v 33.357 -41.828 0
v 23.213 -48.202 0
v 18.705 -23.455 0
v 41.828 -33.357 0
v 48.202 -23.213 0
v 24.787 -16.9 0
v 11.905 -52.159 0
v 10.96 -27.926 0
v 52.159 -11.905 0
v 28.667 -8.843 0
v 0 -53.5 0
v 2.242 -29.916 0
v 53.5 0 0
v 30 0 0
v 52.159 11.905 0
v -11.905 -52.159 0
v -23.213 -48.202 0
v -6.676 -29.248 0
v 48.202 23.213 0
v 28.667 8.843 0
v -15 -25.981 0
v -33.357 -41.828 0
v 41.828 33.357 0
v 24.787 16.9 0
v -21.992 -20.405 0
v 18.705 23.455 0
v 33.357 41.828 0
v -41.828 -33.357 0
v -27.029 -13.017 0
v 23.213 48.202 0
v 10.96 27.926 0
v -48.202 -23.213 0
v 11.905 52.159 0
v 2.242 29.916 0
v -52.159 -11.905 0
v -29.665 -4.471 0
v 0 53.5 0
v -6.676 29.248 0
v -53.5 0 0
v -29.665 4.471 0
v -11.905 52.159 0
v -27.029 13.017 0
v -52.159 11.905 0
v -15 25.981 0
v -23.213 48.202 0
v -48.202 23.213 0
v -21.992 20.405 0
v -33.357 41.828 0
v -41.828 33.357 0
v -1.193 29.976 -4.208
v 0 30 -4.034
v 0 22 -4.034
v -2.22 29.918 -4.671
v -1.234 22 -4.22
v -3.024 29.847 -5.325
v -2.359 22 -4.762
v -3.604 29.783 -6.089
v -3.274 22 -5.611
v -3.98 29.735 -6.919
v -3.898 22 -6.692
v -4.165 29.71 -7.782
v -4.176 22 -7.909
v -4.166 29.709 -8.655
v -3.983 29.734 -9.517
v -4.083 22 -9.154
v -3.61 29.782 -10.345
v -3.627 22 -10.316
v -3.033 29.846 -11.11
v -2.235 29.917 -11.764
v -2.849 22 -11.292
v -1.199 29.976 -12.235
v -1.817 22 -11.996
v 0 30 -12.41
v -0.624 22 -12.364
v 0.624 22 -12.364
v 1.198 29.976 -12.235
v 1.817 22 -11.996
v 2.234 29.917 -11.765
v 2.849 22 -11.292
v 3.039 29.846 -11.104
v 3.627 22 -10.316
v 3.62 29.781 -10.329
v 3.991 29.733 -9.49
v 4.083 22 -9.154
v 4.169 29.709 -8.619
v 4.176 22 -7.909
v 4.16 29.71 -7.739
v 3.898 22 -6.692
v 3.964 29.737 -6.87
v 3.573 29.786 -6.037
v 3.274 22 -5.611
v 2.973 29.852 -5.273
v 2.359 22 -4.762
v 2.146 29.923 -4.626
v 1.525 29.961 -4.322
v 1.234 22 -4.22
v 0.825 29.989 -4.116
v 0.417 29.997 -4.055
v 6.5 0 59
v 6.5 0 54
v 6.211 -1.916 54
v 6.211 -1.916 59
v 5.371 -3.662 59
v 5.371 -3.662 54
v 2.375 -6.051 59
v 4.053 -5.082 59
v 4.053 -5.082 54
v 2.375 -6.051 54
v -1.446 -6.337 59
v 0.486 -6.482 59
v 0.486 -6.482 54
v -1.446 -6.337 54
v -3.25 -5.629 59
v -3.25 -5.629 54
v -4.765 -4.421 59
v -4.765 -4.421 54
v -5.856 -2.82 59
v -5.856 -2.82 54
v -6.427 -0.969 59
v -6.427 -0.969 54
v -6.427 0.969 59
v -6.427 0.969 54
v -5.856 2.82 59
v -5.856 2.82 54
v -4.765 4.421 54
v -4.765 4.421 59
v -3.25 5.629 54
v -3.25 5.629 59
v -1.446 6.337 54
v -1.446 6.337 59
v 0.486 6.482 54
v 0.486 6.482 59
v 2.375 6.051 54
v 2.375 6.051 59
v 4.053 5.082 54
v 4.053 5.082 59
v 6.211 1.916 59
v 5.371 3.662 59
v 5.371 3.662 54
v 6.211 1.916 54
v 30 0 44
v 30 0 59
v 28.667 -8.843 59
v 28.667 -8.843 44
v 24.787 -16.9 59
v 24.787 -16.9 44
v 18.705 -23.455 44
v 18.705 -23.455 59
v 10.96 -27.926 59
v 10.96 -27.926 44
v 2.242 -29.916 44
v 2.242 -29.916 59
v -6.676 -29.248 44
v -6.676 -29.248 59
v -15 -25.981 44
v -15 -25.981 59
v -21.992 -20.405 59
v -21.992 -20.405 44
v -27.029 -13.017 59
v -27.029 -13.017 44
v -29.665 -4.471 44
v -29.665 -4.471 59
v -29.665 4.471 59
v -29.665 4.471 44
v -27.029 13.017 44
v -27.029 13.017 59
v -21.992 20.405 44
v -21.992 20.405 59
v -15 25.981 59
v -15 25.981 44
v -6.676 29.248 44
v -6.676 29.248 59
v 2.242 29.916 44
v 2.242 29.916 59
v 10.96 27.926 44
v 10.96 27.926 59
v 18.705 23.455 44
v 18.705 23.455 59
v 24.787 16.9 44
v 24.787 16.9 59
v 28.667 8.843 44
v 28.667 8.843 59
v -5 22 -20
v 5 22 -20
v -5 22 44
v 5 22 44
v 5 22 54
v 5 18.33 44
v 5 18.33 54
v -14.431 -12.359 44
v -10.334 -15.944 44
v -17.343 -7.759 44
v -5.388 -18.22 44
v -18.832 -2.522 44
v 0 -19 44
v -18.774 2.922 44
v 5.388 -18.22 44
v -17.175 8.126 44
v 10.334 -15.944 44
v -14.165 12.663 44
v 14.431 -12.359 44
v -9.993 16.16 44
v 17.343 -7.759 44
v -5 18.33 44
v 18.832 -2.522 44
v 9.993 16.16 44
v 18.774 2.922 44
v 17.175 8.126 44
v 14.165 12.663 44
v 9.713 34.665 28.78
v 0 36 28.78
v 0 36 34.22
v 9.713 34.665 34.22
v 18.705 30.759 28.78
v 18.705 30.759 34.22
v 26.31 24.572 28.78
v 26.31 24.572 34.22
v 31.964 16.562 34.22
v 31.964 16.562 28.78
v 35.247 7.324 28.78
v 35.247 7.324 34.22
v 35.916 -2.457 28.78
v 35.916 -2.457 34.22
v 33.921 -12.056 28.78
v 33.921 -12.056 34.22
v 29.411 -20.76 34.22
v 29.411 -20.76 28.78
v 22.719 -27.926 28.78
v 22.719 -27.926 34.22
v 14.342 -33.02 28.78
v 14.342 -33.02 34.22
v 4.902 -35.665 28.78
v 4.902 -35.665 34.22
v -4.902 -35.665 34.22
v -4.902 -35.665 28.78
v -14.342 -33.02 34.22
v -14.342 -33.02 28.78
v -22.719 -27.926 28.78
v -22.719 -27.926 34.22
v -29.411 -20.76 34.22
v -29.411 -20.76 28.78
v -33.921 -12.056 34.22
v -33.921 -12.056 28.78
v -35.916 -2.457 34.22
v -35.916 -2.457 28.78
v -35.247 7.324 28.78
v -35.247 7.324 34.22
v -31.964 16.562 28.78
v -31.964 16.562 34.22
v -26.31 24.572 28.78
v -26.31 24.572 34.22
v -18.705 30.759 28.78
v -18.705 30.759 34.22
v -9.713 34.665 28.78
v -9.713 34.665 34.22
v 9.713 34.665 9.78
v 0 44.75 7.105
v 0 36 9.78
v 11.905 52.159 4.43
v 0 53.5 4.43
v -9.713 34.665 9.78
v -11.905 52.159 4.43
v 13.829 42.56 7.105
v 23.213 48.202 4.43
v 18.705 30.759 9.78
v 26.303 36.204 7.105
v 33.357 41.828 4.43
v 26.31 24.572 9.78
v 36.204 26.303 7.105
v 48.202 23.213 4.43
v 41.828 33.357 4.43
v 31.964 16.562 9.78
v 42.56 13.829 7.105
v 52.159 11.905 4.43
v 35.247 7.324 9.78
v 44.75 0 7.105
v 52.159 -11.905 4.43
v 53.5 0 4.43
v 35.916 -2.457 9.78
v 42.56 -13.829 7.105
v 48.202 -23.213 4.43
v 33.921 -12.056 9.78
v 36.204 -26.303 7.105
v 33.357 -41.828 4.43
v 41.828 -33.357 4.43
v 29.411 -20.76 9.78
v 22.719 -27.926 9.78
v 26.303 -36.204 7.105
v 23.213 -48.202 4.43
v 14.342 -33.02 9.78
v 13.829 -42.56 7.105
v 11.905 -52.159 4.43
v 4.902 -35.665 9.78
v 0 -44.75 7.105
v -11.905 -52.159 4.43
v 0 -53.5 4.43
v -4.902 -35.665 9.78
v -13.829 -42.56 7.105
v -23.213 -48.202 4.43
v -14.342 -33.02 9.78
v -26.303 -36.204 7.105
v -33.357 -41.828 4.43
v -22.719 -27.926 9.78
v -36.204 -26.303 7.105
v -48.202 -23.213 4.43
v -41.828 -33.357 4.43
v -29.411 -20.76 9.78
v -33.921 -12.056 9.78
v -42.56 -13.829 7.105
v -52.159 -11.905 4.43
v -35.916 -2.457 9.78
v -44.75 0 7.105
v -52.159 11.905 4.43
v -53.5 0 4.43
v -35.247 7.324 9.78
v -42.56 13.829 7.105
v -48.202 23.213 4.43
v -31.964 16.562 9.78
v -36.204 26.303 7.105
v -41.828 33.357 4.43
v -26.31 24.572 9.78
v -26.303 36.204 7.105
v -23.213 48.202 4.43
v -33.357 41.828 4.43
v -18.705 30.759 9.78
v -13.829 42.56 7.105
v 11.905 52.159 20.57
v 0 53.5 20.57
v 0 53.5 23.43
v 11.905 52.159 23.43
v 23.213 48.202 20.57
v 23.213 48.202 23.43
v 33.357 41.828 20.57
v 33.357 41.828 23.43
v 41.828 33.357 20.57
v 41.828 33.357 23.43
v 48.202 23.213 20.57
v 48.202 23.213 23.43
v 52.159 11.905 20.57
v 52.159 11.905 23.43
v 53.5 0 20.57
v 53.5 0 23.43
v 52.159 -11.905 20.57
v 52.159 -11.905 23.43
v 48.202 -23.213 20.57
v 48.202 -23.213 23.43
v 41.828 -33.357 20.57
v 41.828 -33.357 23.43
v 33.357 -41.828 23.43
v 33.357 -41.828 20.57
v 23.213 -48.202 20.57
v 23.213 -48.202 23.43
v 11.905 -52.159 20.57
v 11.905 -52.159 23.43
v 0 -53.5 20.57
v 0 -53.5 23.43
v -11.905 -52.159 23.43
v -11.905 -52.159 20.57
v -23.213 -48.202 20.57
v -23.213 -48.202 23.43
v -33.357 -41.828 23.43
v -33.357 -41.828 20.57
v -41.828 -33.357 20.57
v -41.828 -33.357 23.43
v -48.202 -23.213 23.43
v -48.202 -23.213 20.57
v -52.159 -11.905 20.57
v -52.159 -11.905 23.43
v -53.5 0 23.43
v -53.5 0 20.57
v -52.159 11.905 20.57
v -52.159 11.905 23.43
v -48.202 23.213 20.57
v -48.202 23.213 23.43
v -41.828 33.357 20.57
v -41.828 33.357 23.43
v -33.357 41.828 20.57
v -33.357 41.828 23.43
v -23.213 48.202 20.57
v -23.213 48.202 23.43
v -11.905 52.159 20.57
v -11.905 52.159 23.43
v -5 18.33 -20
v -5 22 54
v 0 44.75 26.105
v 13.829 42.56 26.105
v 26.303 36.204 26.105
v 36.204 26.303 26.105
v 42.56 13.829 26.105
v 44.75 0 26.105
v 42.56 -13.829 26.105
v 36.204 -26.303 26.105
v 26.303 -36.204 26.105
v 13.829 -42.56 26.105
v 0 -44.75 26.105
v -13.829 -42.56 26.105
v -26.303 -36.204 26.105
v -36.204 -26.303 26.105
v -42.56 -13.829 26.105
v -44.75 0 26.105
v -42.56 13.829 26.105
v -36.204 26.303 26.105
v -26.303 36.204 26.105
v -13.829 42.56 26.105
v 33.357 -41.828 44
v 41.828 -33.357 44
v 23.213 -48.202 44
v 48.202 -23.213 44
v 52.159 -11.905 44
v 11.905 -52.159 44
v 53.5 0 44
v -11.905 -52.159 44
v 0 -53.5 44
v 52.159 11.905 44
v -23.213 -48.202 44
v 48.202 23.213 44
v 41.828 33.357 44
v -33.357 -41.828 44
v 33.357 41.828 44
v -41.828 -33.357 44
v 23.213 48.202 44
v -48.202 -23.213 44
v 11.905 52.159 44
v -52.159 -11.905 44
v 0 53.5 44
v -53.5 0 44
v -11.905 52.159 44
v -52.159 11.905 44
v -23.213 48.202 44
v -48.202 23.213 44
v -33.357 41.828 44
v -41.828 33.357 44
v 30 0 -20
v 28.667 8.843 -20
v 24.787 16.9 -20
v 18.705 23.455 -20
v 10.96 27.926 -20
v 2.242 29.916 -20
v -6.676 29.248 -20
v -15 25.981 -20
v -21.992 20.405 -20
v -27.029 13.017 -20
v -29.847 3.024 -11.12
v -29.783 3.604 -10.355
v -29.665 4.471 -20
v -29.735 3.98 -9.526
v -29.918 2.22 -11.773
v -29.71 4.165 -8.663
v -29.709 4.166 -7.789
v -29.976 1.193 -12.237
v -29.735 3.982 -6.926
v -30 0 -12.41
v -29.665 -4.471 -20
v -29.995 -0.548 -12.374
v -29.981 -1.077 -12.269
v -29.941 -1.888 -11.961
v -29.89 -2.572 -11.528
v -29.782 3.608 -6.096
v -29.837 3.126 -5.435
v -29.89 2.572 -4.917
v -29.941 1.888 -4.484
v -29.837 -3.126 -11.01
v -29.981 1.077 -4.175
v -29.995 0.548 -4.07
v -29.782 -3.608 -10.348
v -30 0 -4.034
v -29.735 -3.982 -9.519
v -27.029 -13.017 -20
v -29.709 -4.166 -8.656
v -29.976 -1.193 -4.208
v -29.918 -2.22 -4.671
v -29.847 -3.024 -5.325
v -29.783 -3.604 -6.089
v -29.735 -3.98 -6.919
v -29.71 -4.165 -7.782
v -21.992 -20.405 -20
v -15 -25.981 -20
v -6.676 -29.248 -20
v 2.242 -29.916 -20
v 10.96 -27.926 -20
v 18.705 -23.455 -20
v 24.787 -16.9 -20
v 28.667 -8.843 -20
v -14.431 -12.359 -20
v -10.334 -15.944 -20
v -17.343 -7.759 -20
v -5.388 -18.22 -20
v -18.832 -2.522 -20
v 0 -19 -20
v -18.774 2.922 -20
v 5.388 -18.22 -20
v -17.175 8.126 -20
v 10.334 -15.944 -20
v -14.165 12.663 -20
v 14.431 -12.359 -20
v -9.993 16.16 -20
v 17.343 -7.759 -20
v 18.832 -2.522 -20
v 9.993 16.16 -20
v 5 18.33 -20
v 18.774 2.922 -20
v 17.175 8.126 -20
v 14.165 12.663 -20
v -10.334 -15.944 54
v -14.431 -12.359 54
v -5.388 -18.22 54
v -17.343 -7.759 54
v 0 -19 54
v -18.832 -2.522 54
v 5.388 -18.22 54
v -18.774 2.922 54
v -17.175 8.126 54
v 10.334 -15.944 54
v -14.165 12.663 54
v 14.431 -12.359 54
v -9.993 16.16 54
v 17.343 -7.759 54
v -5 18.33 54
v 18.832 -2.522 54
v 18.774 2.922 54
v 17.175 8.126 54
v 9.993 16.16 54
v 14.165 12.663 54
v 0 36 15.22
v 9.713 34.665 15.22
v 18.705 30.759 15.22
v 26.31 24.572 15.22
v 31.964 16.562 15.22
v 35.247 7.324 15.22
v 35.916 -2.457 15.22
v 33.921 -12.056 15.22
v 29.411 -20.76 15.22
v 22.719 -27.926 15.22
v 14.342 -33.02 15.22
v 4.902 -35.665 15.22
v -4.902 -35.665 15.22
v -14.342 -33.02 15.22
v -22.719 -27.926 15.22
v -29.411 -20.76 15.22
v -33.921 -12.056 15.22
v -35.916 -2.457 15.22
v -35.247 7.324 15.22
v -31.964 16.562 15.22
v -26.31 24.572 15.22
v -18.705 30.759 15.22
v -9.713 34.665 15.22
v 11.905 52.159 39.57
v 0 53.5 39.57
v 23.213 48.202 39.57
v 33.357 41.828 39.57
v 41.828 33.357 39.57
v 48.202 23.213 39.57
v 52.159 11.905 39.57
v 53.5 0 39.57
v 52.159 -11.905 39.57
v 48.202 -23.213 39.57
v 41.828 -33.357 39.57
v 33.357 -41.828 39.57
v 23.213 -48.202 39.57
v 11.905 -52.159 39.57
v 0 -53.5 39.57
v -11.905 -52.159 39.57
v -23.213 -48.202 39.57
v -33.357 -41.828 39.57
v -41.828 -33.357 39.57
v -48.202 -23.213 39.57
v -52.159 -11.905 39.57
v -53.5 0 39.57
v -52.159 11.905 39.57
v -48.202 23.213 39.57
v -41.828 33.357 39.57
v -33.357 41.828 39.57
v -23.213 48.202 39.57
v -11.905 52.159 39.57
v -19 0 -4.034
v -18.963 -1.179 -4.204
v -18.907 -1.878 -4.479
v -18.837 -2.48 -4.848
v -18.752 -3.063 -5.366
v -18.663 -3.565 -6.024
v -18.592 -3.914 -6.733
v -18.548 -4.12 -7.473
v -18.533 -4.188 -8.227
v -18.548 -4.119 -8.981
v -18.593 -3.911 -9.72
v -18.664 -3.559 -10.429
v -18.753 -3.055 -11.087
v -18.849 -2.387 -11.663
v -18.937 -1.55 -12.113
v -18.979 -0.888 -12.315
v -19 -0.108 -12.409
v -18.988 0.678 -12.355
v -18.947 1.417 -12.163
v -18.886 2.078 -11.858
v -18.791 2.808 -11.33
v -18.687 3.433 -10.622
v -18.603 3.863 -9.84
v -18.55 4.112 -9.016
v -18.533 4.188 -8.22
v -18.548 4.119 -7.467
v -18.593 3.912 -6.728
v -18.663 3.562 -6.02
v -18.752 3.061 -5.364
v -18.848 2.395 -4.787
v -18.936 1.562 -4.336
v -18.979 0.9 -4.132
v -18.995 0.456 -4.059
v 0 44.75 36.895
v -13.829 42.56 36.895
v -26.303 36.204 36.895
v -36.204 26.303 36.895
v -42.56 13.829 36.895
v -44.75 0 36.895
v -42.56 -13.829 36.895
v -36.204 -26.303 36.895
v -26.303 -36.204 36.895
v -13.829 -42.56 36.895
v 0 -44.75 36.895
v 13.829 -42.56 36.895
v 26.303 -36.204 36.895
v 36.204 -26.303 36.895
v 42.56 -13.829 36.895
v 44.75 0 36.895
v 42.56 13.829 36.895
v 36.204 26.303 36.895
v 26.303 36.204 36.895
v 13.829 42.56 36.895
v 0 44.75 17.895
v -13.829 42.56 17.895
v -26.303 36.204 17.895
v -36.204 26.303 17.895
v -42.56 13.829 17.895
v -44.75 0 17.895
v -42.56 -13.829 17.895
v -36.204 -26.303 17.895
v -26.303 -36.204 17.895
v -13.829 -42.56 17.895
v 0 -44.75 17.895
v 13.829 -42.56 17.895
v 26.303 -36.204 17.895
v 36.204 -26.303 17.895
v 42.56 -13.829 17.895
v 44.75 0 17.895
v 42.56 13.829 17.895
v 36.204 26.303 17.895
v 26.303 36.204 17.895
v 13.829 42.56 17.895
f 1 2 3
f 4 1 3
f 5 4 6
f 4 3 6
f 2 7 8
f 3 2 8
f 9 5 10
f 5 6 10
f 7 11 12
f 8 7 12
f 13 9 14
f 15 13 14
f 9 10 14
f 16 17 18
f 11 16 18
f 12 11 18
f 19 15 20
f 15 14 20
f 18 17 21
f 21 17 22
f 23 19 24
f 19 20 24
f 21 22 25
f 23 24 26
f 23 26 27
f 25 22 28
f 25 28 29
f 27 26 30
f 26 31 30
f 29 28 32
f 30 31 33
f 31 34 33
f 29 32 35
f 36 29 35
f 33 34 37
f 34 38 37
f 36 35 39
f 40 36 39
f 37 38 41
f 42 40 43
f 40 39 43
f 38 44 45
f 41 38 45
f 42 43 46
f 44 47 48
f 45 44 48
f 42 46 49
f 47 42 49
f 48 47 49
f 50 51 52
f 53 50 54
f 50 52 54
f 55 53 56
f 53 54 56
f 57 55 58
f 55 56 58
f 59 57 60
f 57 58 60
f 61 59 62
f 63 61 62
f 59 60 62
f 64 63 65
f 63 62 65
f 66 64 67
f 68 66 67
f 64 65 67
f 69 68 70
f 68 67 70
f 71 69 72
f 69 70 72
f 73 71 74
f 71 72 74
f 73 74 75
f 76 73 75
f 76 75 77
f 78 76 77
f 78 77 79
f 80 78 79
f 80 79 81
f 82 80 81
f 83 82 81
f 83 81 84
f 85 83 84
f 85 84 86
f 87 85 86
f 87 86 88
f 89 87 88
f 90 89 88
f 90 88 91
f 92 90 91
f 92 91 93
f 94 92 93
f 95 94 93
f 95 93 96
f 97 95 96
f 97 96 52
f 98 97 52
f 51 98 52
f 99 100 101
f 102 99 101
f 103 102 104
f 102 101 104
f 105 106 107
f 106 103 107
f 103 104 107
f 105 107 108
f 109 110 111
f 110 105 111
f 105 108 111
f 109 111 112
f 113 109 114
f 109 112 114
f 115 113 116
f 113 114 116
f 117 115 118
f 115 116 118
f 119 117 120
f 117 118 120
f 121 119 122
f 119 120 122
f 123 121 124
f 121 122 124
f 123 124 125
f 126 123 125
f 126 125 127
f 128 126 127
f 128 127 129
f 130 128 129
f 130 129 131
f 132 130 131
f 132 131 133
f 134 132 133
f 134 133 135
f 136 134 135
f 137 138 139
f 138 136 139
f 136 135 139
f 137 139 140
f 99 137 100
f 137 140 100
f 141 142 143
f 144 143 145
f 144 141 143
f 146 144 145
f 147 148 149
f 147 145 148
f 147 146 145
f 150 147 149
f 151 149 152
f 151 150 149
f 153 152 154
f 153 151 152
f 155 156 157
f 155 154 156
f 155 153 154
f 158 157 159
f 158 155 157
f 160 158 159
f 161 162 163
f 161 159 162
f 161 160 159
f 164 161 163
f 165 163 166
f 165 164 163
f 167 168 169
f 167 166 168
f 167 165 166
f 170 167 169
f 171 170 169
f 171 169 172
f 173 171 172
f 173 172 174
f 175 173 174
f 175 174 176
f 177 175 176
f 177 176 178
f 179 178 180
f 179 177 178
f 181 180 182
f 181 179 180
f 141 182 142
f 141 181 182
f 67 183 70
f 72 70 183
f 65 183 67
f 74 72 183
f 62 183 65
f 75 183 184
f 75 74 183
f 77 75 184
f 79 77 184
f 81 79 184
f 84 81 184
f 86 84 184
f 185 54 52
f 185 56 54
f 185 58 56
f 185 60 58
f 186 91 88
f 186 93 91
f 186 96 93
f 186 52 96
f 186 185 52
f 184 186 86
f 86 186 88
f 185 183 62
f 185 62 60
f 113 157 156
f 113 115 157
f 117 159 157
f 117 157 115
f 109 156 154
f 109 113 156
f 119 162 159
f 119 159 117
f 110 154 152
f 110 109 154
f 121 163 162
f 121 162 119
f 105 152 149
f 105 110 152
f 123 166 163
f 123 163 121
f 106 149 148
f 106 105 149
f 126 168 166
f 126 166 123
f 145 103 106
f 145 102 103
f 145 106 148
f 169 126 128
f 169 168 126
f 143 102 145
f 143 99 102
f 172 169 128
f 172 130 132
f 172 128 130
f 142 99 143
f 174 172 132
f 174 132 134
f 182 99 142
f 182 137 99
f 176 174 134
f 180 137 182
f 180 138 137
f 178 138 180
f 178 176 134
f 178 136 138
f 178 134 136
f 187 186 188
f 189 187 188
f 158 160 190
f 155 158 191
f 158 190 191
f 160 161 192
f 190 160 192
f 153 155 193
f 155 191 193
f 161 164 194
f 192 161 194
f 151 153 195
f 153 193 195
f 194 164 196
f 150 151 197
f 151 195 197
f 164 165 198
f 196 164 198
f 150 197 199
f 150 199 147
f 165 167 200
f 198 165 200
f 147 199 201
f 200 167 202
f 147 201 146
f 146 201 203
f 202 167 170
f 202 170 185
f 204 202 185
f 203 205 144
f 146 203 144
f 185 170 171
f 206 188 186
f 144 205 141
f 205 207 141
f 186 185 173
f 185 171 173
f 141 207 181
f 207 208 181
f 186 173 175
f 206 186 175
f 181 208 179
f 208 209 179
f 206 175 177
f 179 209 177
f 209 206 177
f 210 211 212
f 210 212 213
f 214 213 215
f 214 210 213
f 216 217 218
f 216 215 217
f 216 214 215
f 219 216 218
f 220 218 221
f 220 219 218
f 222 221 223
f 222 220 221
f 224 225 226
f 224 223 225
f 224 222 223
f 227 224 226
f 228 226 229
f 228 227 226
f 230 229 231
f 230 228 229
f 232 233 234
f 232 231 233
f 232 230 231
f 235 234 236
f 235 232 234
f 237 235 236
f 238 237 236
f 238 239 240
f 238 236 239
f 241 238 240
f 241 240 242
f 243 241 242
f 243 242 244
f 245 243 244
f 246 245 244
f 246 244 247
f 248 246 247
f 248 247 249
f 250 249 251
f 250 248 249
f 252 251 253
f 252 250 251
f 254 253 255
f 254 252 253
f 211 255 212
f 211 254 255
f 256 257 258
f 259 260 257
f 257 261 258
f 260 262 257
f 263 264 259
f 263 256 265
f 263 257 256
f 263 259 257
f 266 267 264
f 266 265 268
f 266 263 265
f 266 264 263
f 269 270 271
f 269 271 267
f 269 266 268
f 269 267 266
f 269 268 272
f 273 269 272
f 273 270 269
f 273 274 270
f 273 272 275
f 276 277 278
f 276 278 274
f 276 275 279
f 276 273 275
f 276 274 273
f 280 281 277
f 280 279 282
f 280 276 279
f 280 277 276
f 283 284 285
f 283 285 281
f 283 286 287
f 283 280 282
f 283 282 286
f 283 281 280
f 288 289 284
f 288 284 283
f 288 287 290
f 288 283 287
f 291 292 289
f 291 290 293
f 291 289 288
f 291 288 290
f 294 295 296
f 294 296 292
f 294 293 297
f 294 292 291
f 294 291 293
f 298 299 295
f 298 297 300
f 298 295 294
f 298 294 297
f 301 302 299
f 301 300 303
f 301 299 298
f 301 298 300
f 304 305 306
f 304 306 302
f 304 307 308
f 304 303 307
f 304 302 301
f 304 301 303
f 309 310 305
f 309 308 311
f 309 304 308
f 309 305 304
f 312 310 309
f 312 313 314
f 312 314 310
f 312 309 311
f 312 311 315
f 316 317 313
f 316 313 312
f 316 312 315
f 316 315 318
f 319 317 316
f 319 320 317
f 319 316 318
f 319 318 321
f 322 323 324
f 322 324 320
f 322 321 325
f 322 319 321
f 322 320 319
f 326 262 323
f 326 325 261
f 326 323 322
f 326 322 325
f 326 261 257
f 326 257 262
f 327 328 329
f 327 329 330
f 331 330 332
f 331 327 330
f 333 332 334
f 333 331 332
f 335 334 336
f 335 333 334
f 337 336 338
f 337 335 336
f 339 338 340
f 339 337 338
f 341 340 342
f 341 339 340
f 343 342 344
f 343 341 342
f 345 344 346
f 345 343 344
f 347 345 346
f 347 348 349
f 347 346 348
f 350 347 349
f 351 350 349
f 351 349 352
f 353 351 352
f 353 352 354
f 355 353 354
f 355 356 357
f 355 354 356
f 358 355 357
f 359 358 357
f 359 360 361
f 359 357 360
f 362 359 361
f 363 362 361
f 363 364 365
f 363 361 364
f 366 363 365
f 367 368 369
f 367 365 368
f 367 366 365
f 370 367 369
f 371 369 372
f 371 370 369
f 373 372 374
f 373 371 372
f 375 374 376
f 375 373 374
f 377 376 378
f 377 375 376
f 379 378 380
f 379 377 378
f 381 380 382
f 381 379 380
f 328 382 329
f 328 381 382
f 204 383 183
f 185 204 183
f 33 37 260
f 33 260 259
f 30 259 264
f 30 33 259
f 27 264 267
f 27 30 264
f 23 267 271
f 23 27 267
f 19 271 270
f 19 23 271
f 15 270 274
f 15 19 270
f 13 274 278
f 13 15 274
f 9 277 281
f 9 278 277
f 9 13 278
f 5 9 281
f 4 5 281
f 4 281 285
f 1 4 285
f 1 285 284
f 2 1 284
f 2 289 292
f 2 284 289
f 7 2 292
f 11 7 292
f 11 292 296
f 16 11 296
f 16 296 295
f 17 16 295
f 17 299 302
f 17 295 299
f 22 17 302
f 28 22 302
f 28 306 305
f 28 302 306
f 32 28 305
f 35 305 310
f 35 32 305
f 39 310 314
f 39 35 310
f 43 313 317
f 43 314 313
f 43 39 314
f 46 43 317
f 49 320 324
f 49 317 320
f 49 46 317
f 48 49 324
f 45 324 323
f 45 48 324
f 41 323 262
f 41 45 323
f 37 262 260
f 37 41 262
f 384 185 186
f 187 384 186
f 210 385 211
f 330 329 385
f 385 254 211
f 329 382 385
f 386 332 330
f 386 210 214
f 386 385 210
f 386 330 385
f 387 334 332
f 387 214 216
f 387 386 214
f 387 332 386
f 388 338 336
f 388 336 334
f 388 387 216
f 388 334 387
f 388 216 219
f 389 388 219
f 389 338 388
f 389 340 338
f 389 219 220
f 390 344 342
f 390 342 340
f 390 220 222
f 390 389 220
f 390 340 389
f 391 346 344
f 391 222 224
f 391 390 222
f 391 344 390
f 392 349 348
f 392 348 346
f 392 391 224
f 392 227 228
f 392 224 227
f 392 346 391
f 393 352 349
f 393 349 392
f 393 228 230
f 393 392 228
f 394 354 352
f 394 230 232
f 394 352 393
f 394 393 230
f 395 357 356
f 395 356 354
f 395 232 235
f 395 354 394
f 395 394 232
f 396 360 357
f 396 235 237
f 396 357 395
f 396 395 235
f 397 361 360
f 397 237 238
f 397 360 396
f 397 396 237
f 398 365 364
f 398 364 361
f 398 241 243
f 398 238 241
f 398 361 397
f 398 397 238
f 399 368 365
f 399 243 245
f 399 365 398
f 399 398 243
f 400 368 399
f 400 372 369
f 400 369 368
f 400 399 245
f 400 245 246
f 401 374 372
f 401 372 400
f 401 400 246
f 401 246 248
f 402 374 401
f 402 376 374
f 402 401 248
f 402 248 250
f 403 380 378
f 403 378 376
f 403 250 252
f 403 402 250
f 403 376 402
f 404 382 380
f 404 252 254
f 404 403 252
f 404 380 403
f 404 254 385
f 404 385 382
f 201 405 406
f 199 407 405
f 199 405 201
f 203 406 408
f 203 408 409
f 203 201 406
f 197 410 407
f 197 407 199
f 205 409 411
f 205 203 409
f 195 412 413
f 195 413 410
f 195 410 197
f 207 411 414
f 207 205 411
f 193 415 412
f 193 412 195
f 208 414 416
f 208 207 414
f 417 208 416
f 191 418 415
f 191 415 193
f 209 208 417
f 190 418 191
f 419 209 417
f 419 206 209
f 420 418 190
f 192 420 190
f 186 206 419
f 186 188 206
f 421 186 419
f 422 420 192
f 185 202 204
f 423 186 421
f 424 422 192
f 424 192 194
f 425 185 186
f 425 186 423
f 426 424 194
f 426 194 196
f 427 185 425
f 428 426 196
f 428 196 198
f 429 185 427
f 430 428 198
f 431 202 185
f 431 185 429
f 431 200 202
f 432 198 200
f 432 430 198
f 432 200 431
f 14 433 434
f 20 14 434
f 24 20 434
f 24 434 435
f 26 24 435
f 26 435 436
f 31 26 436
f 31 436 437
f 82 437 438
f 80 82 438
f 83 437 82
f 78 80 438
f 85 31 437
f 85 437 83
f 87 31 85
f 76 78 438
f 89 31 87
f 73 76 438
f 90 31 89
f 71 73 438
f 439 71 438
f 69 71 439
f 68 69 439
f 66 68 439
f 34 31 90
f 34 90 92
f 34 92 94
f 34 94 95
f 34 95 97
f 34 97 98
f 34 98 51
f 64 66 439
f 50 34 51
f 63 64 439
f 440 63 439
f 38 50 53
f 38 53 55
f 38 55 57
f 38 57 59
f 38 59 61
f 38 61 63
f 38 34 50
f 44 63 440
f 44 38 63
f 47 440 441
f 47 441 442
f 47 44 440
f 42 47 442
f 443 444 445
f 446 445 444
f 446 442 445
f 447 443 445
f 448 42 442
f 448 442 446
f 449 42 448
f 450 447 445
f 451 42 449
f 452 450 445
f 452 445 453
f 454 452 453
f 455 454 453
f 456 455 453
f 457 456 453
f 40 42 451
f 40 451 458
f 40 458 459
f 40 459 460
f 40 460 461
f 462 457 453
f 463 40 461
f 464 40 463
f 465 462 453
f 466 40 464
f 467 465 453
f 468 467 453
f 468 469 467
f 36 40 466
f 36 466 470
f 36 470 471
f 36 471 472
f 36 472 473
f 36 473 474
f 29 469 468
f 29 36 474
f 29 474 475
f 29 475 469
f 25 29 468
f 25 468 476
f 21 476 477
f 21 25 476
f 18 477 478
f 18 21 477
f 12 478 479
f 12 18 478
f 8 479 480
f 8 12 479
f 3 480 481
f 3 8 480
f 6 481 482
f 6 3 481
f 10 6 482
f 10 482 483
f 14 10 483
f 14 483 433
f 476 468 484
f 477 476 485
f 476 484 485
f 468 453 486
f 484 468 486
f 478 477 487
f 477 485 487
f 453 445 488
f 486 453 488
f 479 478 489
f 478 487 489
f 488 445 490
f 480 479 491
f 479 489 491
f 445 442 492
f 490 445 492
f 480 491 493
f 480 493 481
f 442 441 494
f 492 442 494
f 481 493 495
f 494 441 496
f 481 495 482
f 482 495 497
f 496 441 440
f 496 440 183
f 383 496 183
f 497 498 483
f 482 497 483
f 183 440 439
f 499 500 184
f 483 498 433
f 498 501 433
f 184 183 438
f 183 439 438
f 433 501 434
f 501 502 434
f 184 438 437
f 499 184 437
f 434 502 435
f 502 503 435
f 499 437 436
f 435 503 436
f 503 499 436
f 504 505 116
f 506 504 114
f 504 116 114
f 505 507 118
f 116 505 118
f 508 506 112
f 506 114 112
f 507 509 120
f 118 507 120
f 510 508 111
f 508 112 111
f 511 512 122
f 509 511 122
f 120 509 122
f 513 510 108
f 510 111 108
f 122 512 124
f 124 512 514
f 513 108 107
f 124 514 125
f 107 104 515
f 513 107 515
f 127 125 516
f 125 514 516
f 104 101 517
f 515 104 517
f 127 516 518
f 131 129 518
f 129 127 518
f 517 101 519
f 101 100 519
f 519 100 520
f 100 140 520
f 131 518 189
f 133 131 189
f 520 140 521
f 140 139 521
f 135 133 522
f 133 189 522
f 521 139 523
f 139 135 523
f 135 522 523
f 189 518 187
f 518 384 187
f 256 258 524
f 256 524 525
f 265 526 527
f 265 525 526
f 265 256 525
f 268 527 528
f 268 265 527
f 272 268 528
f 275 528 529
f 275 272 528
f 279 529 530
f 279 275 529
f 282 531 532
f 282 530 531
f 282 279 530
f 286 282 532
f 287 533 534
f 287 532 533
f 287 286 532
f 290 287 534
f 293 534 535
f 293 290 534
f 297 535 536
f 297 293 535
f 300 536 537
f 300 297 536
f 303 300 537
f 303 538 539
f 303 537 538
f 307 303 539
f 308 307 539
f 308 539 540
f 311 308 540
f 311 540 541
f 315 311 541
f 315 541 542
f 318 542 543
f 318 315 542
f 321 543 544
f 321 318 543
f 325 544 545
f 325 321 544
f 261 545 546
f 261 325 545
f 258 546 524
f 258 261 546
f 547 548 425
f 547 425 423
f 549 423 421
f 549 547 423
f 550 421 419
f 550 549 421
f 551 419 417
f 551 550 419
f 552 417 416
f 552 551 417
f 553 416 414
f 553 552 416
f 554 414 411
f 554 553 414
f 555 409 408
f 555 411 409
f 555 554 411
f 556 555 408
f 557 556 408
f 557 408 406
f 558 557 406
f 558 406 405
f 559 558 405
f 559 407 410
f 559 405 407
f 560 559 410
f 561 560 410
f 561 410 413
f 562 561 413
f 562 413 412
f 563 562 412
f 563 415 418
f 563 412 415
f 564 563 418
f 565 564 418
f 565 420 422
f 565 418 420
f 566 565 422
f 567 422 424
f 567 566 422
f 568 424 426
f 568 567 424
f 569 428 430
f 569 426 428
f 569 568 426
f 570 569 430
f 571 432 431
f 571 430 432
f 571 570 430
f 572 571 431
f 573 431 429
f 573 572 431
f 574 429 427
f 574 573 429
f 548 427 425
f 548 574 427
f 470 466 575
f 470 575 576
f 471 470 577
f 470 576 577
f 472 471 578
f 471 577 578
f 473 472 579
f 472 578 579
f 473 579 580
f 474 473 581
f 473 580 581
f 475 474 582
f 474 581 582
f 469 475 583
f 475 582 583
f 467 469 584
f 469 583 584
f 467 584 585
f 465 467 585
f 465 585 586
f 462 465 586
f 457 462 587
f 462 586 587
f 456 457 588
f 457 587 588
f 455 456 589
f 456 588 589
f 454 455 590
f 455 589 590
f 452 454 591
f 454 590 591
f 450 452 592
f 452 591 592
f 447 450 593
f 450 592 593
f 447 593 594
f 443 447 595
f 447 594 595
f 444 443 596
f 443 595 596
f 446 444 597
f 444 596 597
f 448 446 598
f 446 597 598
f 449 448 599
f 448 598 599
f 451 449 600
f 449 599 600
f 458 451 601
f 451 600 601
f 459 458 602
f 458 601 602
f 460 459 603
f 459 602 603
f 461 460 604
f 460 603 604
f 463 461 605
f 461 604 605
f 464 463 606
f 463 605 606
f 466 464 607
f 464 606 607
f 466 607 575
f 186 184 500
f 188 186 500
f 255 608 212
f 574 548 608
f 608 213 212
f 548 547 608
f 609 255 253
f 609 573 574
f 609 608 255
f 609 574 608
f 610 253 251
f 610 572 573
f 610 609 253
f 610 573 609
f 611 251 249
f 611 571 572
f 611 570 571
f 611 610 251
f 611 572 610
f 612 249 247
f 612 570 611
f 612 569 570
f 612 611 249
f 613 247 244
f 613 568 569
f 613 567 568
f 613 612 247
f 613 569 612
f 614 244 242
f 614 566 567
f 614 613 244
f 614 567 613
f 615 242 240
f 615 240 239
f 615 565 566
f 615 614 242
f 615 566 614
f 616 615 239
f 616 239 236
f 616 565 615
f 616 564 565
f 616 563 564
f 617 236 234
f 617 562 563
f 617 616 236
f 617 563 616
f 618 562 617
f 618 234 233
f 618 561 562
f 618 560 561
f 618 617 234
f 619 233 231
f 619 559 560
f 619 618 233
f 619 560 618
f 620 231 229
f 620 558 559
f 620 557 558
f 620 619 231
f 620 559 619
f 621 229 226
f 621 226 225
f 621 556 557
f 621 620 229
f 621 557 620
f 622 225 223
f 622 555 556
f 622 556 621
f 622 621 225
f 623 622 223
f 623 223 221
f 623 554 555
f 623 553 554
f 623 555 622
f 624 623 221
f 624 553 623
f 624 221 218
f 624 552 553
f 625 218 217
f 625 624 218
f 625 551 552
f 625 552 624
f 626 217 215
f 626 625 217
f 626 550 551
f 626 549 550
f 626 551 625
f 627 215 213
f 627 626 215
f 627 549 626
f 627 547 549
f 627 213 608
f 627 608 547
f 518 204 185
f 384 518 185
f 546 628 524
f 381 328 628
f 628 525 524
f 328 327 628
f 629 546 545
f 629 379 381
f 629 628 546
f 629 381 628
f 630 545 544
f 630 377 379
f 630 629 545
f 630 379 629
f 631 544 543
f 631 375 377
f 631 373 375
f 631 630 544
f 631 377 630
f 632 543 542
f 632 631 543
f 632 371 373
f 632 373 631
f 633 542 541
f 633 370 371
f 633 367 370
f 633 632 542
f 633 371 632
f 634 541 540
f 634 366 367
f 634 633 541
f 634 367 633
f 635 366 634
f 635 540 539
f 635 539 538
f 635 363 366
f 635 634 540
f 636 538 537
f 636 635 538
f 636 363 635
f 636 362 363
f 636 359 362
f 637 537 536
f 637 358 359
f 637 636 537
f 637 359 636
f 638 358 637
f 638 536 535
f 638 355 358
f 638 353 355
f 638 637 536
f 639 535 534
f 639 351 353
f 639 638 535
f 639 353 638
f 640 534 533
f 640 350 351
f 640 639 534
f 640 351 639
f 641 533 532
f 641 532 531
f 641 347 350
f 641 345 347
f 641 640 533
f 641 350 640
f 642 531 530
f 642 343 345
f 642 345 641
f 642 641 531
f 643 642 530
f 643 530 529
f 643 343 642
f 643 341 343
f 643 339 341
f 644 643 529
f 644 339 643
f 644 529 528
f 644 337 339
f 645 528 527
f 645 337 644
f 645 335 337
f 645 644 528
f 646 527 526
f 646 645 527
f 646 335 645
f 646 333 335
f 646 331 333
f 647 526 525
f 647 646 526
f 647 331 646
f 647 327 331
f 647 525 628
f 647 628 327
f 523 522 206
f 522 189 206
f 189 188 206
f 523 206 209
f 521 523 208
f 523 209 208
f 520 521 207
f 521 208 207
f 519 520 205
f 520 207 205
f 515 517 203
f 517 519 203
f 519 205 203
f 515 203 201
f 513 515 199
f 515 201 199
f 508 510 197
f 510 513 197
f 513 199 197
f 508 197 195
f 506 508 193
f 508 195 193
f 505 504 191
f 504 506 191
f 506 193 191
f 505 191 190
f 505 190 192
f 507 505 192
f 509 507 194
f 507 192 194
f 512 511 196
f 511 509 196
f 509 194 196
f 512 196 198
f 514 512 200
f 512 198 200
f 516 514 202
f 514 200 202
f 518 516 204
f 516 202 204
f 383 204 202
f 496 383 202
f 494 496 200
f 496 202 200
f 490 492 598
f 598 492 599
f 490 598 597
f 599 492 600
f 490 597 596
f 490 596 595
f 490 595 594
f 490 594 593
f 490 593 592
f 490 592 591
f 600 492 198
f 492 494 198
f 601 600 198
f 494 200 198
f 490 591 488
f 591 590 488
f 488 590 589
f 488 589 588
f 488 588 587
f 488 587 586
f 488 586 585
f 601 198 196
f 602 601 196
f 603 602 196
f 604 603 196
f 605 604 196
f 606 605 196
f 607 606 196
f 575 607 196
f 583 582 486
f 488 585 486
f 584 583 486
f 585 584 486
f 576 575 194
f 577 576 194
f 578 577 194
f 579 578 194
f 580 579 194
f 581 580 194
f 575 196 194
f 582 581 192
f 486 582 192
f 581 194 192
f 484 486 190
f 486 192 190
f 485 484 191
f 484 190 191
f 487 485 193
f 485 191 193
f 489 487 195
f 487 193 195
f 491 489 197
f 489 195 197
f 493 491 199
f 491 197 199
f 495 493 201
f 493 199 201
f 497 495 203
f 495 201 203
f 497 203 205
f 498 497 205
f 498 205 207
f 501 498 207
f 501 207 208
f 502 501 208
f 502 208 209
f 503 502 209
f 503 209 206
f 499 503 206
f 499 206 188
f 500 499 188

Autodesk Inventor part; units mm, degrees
ref_plane "YZ Plane" through (0, 0, 0) normal (1, 0, 0) x (0, 1, 0)
sketch "Main Sketch" plane through (0, 0, 0) normal (1, 0, 0) x (0, 1, 0)
  line L0 (0, 44) -> (53.5, 44)
  line L1 (53.5, 44) -> (53.5, 20.5701)
  line L2 (53.5, 20.5701) -> (36, 15.2198)
  line L3 (36, 15.2198) -> (36, 9.7802)
  line L4 (36, 9.7802) -> (53.5, 4.4299)
  line L5 (53.5, 4.4299) -> (53.5, 0)
  line L6 (53.5, 0) -> (0, 0)
  line L7 (50, 19.5) -> (50, 5.5) construction
  line L8 (36, 12.5) -> (50, 12.5) construction
  line L9 (53.5, 20.5701) -> (53.5, 4.4299)
  line L10 (0, -4) -> (0, 24) projected
  line L11 (0, 0) -> (0, 44)
  dimension "d0" = 14
  dimension "d1" = 34
  dimension "d2" = 3.5
  dimension "d6" = 44
  dimension "d21" = 100
  dimension "d25" = 17.5
  dimension "d27" = 12.5
ref_plane "Belt Plane" through (0, 36, 12.5) normal (0, 0, 1) x (1, 0, 0)
revolve "Body" add sketch "Main Sketch" angle 360 about axis through (0, 0, -10) along (0, 0, 1)
revolve "Groove" cut sketch "Main Sketch" angle 360 about axis through (0, 0, -10) along (0, 0, 1) contours L9 L4 L3 L2
fillet "Fillet External" [suppressed]
fillet "Fillet Internal" [suppressed]
pattern_linear "Groove Pattern" count 2 spacing 19 along (0, 0, 1) of "Groove"
sketch "Sketch2" plane through (0, 0, 44) normal (0, 0, 1) x (1, 0, 0)
  circle A0 centre (0, 0) radius 19
  circle A1 centre (0, 0) radius 30
  line L0 (-5, 22) -> (5, 22)
  line L1 (5, 22) -> (5, 16)
  line L2 (5, 16) -> (-5, 16)
  line L3 (-5, 16) -> (-5, 22)
  line L4 (-5, 22) -> (5, 16) construction
  line L5 (5, 22) -> (-5, 16) construction
  circle A2 centre (0, 0) radius 6.5
  point P0 (0, 19)
  point P1 (5, 18.3303)
  point P2 (-5, 18.3303)
  dimension "d28" = 38
  dimension "d29" = 60
  dimension "d30" = 10
  dimension "d31" = 6
  dimension "d47" = 13
extrude "Extrusion1" add sketch "Sketch2" against normal blind 20 from surface at -44 contours A1
ref_plane "Work Plane2" through (0, 30, 44) normal (0, 1, 0) x (-1, 0, 0)
sketch "Sketch3" plane through (0, 30, 44) normal (0, 1, 0) x (-1, 0, 0)
  line L0 (0, -44) -> (0, -64)
  line L1 (30, -64) -> (-30, -64) projected
  circle A0 centre (0, -52.2223) radius 5
  dimension "d34" = 10
hole "Hole1" at (0, 30, -8.2223) direction (0, -1, 0) diameter 8.376 depth 27.3 tip angle 118 thread size "M10x1.5" class "6H" standard "ISO Metric profile"
extrude "Extrusion2" cut sketch "Sketch2" against normal through all contours A0 L3 L2 L1 | L1 L2 L3 A0 | A0 L3 L0 L1 | A2
pattern_circular "Circular Pattern1" count 2 over 90 about axis through (0, 0, 44) along (0, 0, 1) of "Hole1"
extrude "Extrusion3" add sketch "Sketch2" along normal blind 10 separate body contours A1
sketch "Sketch4" plane through (0, 0, 54) normal (0, 0, 1) x (1, 0, 0)
  circle A0 centre (0, 0) radius 30
  arc A1 (-5, 18.3303) -> (5, 18.3303) centre (0, 0) ccw projected
  circle A2 centre (0, 0) radius 6.5
  dimension "d50" = 13
extrude "Extrusion4" add sketch "Sketch4" along normal blind 5 bodies 2
equation "\"d0\" = da_Bw"
equation "\"d1\" = da_Alfa"
equation "\"d2\" = da_c"
equation "\"d21\" = da_Dw"
equation "\"d25\" = da_Hd"
equation "\"d27\" = da_Se"
equation "\"da_r1\" = 0"
equation "\"da_r2\" = 0"
equation "\"d18\" = da_Sg"
equation "\"d5\" = da_Se"
equation "\"da_Bw\" = 14"
equation "\"da_Alfa\" = 34deg"
equation "\"da_c\" = 3.5"
equation "\"da_Dw\" = 100"
equation "\"da_Hd\" = 17.5"
equation "\"da_Se\" = 12.5"
equation "\"da_Sg\" = 19"
properties part number "Grooved Pulley1" material "Steel"
